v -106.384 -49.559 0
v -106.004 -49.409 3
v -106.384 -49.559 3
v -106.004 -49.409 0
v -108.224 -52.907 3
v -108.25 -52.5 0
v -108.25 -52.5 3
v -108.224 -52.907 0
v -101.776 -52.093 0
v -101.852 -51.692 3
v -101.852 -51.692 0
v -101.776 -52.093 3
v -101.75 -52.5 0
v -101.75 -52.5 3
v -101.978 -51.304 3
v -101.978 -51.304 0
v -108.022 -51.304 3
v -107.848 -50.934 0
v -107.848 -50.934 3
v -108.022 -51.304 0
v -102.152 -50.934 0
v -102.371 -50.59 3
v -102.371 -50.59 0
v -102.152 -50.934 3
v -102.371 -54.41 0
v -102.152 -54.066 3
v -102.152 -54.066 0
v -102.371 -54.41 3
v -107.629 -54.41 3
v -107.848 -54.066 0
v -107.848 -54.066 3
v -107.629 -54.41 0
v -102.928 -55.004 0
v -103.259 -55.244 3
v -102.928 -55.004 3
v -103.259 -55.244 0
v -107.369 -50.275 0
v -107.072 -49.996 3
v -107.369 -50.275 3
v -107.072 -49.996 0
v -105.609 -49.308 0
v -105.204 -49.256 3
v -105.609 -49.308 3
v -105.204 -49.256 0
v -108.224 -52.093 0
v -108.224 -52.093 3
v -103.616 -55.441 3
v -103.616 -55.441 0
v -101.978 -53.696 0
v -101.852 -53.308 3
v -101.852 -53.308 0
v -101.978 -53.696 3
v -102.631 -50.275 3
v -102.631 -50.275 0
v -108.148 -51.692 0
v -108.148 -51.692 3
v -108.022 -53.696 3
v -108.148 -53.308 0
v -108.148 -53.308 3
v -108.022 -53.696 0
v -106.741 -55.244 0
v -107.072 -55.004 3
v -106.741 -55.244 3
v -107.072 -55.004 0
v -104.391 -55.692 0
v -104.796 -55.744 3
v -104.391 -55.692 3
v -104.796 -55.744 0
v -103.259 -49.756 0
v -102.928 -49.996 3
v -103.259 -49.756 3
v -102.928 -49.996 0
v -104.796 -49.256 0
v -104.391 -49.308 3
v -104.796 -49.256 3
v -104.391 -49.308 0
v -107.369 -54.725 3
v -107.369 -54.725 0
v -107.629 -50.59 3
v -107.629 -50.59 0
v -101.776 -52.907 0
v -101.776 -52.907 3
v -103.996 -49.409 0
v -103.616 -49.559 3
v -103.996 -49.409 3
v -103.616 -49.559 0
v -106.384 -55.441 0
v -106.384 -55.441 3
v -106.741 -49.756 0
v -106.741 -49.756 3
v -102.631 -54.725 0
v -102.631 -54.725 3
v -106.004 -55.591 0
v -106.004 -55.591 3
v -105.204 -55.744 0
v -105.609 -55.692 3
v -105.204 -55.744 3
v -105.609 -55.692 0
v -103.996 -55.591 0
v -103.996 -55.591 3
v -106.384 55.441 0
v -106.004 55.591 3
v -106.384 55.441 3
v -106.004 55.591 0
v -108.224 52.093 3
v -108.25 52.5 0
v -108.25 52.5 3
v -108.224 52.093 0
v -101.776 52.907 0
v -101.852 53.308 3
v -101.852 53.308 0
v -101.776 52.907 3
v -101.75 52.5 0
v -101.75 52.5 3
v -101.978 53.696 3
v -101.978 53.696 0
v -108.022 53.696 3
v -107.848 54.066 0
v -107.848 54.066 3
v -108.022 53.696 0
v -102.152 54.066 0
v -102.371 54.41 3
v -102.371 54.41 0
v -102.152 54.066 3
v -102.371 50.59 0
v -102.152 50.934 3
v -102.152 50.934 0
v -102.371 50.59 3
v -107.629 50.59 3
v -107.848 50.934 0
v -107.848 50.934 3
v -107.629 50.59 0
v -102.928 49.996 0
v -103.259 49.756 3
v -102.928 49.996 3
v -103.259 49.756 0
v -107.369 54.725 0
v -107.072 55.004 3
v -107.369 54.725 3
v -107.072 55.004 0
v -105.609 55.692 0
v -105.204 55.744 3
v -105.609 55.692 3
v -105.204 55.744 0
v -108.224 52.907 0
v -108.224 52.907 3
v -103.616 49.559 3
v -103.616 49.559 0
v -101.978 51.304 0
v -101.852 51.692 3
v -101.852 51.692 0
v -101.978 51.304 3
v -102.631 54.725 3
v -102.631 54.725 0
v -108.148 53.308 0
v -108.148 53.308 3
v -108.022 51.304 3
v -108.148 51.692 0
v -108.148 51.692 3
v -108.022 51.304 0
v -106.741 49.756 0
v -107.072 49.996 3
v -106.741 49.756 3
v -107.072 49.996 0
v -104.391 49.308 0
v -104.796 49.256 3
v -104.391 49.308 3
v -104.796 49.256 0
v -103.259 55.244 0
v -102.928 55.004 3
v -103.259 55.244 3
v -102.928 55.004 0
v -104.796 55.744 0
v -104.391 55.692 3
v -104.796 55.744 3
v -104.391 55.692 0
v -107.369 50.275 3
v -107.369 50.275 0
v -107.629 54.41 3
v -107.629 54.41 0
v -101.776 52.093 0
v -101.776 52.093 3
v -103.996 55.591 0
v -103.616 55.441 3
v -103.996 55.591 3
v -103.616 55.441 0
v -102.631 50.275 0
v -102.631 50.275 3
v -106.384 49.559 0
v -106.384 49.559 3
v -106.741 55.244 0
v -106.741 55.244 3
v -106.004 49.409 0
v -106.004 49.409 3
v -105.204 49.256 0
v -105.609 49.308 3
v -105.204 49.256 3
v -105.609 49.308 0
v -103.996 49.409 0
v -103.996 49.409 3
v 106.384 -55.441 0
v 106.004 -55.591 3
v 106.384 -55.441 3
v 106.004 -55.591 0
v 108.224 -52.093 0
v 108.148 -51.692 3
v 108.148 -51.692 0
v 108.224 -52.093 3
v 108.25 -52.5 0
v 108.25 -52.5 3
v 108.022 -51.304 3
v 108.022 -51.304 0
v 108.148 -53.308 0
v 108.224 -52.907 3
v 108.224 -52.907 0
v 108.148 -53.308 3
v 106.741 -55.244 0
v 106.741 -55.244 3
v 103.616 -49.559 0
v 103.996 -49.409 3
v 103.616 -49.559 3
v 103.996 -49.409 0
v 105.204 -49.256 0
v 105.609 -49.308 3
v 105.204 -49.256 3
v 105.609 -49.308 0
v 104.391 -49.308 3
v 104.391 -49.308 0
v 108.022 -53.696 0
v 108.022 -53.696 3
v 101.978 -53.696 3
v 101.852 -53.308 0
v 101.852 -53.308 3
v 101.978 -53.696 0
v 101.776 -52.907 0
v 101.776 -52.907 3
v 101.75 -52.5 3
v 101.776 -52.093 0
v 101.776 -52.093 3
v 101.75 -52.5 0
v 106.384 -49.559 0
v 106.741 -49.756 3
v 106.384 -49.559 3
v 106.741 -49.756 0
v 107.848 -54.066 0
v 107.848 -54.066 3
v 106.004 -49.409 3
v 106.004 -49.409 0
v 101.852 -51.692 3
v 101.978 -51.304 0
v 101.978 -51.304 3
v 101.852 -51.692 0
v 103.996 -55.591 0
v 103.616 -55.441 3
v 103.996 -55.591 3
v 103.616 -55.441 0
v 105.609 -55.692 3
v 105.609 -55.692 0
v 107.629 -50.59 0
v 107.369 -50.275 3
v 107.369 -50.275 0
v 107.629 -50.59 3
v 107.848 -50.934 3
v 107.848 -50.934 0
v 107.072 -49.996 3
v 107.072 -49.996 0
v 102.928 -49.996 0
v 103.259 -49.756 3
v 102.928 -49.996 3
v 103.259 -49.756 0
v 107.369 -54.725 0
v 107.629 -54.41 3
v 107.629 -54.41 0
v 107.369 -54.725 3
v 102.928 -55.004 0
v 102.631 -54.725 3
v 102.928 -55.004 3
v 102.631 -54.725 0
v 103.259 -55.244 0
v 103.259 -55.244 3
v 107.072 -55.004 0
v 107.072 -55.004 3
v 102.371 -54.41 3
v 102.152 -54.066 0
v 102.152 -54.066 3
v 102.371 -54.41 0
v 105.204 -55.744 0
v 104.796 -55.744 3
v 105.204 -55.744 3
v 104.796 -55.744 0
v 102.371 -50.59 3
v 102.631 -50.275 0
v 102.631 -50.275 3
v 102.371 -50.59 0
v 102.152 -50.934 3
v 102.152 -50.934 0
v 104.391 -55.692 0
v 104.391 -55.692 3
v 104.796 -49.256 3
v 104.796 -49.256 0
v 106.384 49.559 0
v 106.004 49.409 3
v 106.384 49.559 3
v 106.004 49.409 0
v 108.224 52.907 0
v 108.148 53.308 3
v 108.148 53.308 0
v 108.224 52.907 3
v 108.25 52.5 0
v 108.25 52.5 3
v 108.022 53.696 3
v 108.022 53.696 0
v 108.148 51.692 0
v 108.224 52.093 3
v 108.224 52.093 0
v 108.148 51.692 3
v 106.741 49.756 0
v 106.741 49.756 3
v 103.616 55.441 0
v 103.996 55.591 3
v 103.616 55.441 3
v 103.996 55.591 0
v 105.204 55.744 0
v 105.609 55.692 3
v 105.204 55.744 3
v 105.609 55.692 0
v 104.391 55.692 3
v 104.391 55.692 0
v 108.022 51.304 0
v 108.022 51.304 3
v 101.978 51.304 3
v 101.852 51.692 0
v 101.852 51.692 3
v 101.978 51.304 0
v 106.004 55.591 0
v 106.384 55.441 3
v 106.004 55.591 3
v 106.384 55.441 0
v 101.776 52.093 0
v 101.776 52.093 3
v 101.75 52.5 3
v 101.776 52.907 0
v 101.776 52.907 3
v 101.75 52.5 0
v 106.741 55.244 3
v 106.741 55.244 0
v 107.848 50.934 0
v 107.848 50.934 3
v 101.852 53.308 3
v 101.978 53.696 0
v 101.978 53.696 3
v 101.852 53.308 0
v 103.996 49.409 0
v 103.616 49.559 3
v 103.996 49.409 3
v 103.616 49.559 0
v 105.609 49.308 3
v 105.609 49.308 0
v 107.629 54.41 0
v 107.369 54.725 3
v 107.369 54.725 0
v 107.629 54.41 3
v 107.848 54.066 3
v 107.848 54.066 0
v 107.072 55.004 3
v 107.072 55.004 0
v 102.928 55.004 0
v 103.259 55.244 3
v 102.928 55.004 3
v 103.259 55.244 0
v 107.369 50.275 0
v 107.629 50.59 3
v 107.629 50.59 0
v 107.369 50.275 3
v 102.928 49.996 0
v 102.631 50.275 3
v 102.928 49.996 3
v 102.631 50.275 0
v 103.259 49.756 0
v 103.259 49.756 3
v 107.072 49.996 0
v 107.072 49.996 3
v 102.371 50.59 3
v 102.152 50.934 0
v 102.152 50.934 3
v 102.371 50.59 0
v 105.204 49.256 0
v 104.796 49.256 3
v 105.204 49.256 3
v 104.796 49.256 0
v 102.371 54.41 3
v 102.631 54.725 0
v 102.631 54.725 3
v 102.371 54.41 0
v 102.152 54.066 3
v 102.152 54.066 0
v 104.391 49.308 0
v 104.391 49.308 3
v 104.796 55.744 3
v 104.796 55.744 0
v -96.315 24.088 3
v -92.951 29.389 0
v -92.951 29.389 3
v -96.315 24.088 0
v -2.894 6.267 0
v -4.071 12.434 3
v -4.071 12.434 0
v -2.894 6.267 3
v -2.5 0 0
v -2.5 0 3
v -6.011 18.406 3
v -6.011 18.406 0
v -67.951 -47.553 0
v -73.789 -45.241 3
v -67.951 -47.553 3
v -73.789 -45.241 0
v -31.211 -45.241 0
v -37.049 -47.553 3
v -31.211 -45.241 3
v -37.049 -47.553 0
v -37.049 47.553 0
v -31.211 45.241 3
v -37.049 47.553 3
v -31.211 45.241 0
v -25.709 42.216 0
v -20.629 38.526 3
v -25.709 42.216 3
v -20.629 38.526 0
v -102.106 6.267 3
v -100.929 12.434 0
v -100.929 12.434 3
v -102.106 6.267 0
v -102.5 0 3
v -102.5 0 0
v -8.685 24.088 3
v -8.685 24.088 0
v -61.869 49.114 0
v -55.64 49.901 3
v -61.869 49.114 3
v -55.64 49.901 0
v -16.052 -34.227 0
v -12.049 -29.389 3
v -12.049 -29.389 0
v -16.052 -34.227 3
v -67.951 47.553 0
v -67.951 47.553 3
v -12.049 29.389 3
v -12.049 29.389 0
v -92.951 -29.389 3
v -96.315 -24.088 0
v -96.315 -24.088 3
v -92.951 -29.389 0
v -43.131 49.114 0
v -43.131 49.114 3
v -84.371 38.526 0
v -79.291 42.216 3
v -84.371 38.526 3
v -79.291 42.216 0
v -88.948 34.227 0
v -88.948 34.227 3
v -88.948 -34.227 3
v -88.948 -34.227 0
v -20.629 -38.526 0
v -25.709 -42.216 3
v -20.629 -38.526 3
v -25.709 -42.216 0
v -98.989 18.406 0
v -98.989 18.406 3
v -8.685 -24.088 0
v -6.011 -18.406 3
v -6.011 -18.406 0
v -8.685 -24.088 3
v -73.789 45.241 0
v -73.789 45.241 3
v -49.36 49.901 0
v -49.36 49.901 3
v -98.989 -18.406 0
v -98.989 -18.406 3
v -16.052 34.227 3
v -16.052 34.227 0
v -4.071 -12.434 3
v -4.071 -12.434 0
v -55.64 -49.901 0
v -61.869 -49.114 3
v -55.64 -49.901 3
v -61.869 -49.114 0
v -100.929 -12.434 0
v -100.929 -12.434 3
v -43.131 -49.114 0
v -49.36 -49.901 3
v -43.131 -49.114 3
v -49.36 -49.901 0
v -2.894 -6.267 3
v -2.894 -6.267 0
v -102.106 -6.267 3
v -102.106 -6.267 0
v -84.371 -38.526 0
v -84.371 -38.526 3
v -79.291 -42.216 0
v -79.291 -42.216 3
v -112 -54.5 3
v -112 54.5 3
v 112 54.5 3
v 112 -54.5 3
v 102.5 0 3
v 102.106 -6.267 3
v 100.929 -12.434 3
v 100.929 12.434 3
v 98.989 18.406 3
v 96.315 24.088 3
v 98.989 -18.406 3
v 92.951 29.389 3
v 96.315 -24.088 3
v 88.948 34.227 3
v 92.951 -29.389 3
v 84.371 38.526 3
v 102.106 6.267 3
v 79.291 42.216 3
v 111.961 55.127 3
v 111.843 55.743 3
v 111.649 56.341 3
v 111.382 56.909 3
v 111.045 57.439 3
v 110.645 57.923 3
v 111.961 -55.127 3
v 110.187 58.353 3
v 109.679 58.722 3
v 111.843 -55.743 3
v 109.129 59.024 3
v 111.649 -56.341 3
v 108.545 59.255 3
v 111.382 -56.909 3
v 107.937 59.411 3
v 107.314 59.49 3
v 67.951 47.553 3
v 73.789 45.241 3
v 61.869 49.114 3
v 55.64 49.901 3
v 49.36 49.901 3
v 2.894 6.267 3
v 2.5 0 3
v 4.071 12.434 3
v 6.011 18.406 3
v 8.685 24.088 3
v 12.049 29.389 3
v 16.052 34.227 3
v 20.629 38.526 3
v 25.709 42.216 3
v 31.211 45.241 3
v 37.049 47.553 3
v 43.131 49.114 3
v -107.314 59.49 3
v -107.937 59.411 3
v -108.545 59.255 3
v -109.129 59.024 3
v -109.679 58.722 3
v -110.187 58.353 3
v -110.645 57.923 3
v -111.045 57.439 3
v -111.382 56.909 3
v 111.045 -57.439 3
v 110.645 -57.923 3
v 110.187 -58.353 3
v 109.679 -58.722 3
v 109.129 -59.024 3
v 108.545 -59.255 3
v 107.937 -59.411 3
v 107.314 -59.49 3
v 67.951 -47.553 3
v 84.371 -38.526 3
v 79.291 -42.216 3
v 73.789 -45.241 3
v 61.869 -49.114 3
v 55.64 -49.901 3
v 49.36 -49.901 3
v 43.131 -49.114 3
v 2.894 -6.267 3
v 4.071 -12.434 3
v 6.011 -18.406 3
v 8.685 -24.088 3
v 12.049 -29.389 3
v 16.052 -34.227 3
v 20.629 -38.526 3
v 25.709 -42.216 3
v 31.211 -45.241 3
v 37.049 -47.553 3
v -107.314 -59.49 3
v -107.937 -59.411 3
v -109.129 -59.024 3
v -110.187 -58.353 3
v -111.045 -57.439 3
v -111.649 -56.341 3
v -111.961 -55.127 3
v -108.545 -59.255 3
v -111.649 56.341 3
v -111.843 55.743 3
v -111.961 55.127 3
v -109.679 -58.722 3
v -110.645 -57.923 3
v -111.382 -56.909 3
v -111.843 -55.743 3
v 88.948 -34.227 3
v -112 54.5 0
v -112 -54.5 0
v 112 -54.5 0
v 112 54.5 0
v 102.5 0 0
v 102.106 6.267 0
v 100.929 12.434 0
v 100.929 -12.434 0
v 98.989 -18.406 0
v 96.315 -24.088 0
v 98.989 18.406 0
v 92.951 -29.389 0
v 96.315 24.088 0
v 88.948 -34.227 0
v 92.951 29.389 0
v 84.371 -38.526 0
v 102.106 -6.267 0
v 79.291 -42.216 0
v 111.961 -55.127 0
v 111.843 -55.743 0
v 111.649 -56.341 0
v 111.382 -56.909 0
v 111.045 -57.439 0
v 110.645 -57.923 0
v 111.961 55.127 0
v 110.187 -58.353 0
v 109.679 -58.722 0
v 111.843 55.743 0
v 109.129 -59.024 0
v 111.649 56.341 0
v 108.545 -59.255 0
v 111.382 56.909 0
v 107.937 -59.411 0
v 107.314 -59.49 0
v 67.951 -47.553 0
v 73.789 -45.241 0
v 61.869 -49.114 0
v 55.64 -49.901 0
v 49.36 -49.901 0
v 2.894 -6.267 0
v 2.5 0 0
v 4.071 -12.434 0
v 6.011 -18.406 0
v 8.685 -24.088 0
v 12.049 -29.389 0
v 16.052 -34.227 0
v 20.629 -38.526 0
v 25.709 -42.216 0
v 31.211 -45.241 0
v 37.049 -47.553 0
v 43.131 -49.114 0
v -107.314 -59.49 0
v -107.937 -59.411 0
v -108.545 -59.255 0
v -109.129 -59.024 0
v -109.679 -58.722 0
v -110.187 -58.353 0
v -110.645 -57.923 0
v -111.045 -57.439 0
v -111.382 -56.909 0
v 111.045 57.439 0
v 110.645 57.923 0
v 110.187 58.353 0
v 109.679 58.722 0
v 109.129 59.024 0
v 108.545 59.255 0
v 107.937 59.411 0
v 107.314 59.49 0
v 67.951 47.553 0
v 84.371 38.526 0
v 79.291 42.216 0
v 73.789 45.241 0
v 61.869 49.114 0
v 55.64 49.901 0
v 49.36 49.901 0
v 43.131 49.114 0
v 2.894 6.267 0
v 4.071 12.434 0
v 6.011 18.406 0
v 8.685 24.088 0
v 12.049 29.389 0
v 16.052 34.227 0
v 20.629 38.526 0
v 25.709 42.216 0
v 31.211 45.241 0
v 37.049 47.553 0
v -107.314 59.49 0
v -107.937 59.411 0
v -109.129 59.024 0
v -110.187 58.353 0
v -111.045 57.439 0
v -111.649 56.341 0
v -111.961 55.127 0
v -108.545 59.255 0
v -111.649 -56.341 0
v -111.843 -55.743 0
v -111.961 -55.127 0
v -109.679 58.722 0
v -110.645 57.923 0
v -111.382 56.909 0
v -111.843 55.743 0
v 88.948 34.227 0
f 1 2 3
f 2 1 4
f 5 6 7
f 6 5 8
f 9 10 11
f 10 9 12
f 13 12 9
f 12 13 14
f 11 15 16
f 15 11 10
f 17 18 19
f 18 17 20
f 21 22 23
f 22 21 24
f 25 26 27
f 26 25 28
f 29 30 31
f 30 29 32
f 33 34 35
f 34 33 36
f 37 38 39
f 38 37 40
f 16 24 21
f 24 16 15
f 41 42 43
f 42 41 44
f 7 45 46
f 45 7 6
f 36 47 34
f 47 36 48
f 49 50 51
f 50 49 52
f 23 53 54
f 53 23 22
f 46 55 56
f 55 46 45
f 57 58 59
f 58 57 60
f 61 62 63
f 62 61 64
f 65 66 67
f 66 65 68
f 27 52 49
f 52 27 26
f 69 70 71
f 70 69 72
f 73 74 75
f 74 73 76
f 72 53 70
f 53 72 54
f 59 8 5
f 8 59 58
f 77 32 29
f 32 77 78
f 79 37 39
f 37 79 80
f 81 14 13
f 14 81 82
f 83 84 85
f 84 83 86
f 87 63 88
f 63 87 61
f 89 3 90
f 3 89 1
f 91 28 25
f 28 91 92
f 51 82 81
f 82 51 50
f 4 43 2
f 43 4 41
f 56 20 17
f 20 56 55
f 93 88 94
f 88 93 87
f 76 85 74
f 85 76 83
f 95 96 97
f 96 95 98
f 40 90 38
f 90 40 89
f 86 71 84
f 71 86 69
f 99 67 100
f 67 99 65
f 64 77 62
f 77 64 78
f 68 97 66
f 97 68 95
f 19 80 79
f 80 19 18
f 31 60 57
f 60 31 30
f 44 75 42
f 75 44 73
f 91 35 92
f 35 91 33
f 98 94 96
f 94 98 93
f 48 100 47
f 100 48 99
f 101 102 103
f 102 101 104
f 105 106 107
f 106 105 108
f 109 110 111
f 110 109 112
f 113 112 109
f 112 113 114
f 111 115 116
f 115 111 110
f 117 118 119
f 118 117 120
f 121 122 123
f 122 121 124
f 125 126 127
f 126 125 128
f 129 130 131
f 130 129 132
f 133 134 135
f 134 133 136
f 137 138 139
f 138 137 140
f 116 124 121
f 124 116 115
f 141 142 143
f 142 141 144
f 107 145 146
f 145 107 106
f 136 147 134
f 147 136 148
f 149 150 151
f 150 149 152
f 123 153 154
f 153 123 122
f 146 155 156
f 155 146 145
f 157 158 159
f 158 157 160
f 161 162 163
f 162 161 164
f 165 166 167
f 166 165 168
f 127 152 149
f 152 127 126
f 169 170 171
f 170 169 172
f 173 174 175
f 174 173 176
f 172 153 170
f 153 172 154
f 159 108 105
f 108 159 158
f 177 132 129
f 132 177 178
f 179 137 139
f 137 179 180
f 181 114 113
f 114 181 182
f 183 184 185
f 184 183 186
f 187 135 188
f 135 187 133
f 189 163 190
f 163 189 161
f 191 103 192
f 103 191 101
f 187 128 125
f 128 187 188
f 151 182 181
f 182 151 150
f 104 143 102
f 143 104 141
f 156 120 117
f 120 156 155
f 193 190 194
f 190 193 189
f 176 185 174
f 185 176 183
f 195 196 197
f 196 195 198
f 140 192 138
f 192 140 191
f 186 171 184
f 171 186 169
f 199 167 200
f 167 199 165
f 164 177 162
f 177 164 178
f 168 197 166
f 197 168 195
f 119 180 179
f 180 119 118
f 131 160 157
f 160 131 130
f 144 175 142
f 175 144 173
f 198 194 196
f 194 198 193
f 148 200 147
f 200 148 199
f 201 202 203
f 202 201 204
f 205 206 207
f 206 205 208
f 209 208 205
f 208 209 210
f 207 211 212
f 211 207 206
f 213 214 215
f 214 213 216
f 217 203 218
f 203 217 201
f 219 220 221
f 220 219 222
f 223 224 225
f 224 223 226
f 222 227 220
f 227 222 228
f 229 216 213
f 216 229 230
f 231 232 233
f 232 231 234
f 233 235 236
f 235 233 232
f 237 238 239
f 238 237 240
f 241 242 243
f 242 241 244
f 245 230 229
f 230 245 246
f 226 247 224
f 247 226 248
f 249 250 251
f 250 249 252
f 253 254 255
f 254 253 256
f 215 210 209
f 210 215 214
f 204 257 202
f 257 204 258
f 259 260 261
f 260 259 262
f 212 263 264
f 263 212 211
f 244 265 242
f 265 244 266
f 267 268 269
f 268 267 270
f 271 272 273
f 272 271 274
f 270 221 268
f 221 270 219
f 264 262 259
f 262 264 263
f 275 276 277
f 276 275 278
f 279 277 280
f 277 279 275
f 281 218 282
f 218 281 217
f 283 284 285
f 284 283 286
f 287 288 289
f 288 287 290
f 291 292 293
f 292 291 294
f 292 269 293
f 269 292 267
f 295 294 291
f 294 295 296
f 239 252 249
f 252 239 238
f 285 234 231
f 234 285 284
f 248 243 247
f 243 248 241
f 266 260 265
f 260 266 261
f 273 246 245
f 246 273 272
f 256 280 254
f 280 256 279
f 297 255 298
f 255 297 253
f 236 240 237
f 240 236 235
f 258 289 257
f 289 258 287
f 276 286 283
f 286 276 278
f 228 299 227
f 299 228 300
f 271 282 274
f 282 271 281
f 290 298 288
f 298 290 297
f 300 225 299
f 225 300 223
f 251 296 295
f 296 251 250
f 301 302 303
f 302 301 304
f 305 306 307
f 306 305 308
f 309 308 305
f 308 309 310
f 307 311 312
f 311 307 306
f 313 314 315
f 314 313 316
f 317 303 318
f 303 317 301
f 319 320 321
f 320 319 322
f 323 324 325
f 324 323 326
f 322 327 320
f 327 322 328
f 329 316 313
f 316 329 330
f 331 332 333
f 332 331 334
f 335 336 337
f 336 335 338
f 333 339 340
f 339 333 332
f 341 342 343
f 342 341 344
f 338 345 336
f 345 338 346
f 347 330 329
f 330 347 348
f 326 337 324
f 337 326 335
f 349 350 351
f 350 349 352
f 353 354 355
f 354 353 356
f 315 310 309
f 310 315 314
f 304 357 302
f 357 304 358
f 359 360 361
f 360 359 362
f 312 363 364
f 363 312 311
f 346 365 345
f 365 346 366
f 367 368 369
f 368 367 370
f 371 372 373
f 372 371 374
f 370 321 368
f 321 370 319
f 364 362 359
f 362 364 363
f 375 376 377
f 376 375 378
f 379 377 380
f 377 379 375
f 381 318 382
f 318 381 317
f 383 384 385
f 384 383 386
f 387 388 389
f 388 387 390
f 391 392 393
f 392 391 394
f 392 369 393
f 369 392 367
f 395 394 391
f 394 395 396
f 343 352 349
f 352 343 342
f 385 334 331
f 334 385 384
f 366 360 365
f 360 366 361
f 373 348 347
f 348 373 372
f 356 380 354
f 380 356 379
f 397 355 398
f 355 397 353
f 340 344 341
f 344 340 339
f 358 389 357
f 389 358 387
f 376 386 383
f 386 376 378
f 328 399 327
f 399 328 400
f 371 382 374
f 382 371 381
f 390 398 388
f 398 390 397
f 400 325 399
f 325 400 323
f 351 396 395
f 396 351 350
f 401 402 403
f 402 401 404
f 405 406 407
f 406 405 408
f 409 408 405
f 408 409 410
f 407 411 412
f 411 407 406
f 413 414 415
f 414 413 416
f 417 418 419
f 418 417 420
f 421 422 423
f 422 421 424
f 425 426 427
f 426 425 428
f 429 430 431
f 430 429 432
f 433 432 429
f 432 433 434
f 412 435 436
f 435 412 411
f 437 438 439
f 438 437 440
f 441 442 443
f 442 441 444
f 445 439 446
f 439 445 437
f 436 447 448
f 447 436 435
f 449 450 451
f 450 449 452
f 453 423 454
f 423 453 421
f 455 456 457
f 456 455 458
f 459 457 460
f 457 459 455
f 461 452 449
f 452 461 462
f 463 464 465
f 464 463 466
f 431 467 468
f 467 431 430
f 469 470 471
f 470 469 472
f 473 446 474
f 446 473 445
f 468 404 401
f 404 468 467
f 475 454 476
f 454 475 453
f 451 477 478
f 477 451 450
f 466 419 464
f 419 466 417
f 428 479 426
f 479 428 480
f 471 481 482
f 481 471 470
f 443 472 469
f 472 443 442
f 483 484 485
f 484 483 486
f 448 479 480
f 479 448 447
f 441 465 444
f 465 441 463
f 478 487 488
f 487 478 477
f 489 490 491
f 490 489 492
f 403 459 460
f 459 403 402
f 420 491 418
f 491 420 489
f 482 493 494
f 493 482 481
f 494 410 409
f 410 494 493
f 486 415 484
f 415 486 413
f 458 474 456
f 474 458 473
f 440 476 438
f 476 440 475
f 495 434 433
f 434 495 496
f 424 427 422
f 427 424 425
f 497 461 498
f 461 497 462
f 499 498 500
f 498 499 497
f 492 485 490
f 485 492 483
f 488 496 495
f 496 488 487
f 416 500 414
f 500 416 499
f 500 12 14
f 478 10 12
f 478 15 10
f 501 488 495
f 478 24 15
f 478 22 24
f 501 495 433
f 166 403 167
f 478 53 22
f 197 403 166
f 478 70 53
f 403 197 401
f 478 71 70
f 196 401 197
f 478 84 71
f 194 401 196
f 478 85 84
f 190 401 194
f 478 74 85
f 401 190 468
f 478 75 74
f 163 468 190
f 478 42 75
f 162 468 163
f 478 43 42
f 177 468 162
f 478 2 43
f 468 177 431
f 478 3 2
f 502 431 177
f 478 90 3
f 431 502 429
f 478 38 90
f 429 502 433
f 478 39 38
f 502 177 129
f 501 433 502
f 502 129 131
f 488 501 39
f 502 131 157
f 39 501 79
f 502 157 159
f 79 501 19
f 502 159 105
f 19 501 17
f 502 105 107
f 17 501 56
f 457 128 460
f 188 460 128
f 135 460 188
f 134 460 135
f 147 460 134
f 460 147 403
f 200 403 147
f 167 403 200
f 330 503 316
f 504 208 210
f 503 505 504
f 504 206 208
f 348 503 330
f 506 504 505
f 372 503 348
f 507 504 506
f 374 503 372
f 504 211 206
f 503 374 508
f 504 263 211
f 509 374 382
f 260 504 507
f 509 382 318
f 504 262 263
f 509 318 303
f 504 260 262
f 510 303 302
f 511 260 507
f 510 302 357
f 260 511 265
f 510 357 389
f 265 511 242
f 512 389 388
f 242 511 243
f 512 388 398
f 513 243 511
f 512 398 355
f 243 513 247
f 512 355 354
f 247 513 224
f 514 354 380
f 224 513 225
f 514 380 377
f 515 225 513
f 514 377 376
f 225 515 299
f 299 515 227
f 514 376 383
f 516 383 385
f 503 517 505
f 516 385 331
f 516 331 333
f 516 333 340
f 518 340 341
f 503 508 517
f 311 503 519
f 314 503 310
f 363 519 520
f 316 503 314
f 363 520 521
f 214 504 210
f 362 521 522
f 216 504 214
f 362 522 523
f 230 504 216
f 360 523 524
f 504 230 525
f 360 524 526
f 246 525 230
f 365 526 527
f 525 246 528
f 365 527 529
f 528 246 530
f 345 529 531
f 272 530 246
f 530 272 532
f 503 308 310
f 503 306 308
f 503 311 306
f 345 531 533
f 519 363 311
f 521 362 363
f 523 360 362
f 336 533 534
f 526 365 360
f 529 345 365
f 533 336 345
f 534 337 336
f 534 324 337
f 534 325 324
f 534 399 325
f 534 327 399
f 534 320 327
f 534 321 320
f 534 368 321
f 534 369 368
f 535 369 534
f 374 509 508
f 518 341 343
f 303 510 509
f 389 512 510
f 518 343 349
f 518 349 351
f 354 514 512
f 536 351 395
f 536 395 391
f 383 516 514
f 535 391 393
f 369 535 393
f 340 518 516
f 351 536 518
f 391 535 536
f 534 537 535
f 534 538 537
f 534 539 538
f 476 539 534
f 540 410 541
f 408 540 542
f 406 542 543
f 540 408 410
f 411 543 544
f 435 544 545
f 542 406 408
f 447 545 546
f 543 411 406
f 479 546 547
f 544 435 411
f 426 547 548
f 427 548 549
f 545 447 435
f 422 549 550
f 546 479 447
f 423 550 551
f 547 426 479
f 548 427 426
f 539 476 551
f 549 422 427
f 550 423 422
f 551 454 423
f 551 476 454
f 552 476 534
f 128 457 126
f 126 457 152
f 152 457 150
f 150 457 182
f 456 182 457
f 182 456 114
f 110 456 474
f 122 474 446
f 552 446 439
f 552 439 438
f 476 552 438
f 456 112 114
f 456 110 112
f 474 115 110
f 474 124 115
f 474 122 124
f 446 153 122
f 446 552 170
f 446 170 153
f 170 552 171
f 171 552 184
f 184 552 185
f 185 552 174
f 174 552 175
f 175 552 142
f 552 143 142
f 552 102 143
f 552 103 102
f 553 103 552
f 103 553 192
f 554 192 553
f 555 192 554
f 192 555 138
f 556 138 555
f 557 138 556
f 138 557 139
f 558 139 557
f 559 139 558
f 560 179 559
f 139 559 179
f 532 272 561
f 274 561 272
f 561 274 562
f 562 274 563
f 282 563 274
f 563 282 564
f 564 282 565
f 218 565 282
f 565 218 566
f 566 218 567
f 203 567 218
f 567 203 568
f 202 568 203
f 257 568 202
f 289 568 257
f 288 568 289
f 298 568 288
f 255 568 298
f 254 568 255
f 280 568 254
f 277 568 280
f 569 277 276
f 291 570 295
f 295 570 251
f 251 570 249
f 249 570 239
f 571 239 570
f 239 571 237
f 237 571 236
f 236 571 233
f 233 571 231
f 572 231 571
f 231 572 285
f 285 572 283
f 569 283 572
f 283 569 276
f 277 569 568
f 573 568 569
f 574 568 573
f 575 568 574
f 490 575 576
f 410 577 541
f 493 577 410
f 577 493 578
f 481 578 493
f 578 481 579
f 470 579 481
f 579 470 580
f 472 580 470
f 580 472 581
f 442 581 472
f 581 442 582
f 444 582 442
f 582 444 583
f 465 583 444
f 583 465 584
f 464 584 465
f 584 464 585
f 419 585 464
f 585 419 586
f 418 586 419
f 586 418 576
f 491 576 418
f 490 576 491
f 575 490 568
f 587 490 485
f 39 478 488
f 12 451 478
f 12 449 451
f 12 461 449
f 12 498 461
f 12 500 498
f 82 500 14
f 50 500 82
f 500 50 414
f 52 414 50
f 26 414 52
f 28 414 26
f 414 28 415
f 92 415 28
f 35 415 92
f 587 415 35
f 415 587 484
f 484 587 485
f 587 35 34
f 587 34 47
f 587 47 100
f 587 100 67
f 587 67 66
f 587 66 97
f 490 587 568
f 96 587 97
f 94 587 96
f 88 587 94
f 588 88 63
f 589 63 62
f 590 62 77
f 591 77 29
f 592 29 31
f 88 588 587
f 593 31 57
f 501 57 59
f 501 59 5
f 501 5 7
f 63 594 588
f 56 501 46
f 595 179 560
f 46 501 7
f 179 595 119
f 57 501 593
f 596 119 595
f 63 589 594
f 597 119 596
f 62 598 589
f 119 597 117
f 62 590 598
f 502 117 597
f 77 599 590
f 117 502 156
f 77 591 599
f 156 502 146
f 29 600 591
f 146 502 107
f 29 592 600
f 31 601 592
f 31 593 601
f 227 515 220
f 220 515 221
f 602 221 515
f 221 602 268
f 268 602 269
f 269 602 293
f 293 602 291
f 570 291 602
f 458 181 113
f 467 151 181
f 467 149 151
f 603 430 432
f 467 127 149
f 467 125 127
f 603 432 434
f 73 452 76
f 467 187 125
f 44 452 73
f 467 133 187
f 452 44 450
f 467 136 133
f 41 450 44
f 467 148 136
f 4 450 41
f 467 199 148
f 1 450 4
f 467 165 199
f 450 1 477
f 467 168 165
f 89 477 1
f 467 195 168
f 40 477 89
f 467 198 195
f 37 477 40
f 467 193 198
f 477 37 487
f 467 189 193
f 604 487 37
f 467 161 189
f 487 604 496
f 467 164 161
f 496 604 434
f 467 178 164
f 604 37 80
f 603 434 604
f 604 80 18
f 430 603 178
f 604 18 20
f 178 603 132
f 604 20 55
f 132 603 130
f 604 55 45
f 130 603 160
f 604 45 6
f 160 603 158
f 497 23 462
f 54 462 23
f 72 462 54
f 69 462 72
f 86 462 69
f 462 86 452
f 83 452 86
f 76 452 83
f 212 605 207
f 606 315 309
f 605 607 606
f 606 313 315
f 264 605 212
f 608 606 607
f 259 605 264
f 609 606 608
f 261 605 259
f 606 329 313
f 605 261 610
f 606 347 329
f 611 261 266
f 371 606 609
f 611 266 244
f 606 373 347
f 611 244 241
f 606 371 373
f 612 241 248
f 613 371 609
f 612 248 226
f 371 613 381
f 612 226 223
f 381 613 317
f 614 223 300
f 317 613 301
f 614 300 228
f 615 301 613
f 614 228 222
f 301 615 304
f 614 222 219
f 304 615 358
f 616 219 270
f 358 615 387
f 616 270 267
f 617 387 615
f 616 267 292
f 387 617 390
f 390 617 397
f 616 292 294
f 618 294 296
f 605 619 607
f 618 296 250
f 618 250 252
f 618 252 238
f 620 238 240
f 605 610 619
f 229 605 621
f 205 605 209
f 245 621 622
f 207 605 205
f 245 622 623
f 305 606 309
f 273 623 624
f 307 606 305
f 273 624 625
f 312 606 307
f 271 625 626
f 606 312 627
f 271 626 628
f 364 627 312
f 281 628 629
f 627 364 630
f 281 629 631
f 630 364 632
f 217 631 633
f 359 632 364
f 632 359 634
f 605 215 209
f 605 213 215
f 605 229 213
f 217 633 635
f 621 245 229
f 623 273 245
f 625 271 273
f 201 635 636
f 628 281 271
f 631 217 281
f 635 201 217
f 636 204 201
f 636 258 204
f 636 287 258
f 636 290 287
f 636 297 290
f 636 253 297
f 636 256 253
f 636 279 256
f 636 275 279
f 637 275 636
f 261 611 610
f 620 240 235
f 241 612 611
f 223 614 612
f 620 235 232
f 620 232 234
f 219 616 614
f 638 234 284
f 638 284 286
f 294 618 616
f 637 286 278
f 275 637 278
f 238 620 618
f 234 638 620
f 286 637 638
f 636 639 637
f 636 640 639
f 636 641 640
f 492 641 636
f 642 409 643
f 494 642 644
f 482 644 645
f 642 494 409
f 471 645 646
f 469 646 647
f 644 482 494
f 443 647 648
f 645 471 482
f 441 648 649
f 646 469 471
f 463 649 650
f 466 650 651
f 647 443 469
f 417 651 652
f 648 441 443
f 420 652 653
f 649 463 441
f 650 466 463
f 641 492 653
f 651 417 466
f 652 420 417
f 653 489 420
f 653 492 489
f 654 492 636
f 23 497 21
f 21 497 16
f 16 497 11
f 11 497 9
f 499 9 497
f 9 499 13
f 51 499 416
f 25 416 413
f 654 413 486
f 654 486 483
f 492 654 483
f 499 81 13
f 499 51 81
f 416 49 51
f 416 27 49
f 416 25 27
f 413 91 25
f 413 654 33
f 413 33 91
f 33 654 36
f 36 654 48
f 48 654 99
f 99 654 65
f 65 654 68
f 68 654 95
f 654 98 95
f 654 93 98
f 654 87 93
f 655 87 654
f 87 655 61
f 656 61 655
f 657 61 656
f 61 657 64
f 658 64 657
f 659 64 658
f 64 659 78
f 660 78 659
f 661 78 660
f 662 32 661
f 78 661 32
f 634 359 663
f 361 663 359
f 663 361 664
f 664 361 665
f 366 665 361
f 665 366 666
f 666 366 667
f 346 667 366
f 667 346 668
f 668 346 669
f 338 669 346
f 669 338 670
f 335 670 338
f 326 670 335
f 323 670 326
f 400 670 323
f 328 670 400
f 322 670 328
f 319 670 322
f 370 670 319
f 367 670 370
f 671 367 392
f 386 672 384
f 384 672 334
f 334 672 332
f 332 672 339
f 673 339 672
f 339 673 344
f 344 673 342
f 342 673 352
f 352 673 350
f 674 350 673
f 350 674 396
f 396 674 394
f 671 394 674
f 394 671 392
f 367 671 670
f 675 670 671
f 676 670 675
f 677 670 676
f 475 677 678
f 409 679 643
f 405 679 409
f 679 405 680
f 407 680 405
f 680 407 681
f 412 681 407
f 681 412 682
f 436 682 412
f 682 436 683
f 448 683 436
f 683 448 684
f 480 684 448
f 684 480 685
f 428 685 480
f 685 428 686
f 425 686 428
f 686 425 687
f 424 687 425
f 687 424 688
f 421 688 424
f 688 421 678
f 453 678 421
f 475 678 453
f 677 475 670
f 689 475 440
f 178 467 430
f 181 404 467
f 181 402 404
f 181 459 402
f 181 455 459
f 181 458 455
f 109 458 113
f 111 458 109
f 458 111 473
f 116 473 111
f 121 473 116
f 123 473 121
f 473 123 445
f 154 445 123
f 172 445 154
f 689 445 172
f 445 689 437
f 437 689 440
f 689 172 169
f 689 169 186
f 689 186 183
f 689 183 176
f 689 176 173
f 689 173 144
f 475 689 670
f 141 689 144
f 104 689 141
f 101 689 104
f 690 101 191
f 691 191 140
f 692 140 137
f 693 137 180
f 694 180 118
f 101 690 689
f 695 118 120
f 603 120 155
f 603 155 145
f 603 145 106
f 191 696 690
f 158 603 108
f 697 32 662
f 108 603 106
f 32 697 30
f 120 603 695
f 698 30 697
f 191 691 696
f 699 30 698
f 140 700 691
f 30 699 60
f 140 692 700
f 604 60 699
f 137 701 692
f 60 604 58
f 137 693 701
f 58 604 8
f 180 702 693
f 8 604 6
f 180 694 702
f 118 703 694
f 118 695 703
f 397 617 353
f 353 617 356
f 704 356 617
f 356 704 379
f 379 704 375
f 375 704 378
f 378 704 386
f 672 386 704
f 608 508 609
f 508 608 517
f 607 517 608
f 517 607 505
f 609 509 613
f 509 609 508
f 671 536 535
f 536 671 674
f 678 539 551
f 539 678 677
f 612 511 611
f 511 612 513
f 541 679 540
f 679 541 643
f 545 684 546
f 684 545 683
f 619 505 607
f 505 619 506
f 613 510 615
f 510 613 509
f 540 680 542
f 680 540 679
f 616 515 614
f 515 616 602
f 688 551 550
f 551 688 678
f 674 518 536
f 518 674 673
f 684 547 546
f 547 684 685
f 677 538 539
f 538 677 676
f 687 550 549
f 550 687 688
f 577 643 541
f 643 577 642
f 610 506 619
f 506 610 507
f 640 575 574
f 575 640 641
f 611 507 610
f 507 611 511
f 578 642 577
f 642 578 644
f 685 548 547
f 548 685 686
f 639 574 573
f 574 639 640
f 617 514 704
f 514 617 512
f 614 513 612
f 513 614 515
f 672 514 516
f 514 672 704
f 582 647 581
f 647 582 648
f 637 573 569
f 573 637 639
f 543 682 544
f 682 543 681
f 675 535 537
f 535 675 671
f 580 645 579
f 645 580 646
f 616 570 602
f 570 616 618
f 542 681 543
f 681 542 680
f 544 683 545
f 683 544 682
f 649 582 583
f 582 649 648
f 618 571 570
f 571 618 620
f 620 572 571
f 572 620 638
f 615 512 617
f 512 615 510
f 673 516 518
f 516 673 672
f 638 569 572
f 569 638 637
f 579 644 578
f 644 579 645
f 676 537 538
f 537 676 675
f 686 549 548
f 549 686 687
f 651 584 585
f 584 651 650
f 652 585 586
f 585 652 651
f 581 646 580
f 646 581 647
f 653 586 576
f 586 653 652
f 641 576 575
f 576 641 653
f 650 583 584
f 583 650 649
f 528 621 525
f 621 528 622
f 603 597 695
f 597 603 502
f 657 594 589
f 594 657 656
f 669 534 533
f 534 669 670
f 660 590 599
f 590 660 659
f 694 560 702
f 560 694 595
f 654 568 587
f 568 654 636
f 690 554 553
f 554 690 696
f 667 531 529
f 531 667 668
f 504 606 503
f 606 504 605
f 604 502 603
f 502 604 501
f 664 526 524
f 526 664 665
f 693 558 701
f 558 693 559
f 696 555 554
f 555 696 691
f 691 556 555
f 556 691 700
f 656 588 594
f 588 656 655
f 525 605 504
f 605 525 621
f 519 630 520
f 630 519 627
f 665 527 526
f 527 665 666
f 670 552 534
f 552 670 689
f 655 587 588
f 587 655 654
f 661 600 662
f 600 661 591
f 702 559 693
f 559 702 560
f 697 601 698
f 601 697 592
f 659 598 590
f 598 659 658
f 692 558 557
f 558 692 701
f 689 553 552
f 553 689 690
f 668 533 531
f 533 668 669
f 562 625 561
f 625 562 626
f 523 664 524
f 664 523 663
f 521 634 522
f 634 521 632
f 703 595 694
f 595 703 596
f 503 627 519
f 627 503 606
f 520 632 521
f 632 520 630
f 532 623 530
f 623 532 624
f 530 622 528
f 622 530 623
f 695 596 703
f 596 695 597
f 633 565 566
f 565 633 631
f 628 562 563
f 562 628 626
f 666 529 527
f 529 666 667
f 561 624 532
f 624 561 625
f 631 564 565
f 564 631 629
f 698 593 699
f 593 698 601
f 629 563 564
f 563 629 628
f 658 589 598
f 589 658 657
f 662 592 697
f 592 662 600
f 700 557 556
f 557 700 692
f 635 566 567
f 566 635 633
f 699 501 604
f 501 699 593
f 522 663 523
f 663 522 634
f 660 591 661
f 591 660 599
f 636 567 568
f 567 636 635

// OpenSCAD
$fn = 50;

difference() {
	union() {
		hull() {
			translate(v = [-107.0, 54.5, 0]) {
				cylinder(h = 3, r = 5);
			}
			translate(v = [107.0, 54.5, 0]) {
				cylinder(h = 3, r = 5);
			}
			translate(v = [-107.0, -54.5, 0]) {
				cylinder(h = 3, r = 5);
			}
			translate(v = [107.0, -54.5, 0]) {
				cylinder(h = 3, r = 5);
			}
		}
	}
	union() {
		translate(v = [-105.0, -52.5, -100.0]) {
			cylinder(h = 200, r = 3.25);
		}
		translate(v = [-105.0, 52.5, -100.0]) {
			cylinder(h = 200, r = 3.25);
		}
		translate(v = [105.0, -52.5, -100.0]) {
			cylinder(h = 200, r = 3.25);
		}
		translate(v = [105.0, 52.5, -100.0]) {
			cylinder(h = 200, r = 3.25);
		}
		translate(v = [-105.0, -52.5, -100.0]) {
			cylinder(h = 200, r = 1.8);
		}
		translate(v = [-105.0, 52.5, -100.0]) {
			cylinder(h = 200, r = 1.8);
		}
		translate(v = [105.0, -52.5, -100.0]) {
			cylinder(h = 200, r = 1.8);
		}
		translate(v = [105.0, 52.5, -100.0]) {
			cylinder(h = 200, r = 1.8);
		}
		translate(v = [-52.5, 0, 0.0]) {
			cylinder(h = 3, r = 50.0);
		}
		translate(v = [52.5, 0, 0.0]) {
			cylinder(h = 3, r = 50.0);
		}
	}
}
